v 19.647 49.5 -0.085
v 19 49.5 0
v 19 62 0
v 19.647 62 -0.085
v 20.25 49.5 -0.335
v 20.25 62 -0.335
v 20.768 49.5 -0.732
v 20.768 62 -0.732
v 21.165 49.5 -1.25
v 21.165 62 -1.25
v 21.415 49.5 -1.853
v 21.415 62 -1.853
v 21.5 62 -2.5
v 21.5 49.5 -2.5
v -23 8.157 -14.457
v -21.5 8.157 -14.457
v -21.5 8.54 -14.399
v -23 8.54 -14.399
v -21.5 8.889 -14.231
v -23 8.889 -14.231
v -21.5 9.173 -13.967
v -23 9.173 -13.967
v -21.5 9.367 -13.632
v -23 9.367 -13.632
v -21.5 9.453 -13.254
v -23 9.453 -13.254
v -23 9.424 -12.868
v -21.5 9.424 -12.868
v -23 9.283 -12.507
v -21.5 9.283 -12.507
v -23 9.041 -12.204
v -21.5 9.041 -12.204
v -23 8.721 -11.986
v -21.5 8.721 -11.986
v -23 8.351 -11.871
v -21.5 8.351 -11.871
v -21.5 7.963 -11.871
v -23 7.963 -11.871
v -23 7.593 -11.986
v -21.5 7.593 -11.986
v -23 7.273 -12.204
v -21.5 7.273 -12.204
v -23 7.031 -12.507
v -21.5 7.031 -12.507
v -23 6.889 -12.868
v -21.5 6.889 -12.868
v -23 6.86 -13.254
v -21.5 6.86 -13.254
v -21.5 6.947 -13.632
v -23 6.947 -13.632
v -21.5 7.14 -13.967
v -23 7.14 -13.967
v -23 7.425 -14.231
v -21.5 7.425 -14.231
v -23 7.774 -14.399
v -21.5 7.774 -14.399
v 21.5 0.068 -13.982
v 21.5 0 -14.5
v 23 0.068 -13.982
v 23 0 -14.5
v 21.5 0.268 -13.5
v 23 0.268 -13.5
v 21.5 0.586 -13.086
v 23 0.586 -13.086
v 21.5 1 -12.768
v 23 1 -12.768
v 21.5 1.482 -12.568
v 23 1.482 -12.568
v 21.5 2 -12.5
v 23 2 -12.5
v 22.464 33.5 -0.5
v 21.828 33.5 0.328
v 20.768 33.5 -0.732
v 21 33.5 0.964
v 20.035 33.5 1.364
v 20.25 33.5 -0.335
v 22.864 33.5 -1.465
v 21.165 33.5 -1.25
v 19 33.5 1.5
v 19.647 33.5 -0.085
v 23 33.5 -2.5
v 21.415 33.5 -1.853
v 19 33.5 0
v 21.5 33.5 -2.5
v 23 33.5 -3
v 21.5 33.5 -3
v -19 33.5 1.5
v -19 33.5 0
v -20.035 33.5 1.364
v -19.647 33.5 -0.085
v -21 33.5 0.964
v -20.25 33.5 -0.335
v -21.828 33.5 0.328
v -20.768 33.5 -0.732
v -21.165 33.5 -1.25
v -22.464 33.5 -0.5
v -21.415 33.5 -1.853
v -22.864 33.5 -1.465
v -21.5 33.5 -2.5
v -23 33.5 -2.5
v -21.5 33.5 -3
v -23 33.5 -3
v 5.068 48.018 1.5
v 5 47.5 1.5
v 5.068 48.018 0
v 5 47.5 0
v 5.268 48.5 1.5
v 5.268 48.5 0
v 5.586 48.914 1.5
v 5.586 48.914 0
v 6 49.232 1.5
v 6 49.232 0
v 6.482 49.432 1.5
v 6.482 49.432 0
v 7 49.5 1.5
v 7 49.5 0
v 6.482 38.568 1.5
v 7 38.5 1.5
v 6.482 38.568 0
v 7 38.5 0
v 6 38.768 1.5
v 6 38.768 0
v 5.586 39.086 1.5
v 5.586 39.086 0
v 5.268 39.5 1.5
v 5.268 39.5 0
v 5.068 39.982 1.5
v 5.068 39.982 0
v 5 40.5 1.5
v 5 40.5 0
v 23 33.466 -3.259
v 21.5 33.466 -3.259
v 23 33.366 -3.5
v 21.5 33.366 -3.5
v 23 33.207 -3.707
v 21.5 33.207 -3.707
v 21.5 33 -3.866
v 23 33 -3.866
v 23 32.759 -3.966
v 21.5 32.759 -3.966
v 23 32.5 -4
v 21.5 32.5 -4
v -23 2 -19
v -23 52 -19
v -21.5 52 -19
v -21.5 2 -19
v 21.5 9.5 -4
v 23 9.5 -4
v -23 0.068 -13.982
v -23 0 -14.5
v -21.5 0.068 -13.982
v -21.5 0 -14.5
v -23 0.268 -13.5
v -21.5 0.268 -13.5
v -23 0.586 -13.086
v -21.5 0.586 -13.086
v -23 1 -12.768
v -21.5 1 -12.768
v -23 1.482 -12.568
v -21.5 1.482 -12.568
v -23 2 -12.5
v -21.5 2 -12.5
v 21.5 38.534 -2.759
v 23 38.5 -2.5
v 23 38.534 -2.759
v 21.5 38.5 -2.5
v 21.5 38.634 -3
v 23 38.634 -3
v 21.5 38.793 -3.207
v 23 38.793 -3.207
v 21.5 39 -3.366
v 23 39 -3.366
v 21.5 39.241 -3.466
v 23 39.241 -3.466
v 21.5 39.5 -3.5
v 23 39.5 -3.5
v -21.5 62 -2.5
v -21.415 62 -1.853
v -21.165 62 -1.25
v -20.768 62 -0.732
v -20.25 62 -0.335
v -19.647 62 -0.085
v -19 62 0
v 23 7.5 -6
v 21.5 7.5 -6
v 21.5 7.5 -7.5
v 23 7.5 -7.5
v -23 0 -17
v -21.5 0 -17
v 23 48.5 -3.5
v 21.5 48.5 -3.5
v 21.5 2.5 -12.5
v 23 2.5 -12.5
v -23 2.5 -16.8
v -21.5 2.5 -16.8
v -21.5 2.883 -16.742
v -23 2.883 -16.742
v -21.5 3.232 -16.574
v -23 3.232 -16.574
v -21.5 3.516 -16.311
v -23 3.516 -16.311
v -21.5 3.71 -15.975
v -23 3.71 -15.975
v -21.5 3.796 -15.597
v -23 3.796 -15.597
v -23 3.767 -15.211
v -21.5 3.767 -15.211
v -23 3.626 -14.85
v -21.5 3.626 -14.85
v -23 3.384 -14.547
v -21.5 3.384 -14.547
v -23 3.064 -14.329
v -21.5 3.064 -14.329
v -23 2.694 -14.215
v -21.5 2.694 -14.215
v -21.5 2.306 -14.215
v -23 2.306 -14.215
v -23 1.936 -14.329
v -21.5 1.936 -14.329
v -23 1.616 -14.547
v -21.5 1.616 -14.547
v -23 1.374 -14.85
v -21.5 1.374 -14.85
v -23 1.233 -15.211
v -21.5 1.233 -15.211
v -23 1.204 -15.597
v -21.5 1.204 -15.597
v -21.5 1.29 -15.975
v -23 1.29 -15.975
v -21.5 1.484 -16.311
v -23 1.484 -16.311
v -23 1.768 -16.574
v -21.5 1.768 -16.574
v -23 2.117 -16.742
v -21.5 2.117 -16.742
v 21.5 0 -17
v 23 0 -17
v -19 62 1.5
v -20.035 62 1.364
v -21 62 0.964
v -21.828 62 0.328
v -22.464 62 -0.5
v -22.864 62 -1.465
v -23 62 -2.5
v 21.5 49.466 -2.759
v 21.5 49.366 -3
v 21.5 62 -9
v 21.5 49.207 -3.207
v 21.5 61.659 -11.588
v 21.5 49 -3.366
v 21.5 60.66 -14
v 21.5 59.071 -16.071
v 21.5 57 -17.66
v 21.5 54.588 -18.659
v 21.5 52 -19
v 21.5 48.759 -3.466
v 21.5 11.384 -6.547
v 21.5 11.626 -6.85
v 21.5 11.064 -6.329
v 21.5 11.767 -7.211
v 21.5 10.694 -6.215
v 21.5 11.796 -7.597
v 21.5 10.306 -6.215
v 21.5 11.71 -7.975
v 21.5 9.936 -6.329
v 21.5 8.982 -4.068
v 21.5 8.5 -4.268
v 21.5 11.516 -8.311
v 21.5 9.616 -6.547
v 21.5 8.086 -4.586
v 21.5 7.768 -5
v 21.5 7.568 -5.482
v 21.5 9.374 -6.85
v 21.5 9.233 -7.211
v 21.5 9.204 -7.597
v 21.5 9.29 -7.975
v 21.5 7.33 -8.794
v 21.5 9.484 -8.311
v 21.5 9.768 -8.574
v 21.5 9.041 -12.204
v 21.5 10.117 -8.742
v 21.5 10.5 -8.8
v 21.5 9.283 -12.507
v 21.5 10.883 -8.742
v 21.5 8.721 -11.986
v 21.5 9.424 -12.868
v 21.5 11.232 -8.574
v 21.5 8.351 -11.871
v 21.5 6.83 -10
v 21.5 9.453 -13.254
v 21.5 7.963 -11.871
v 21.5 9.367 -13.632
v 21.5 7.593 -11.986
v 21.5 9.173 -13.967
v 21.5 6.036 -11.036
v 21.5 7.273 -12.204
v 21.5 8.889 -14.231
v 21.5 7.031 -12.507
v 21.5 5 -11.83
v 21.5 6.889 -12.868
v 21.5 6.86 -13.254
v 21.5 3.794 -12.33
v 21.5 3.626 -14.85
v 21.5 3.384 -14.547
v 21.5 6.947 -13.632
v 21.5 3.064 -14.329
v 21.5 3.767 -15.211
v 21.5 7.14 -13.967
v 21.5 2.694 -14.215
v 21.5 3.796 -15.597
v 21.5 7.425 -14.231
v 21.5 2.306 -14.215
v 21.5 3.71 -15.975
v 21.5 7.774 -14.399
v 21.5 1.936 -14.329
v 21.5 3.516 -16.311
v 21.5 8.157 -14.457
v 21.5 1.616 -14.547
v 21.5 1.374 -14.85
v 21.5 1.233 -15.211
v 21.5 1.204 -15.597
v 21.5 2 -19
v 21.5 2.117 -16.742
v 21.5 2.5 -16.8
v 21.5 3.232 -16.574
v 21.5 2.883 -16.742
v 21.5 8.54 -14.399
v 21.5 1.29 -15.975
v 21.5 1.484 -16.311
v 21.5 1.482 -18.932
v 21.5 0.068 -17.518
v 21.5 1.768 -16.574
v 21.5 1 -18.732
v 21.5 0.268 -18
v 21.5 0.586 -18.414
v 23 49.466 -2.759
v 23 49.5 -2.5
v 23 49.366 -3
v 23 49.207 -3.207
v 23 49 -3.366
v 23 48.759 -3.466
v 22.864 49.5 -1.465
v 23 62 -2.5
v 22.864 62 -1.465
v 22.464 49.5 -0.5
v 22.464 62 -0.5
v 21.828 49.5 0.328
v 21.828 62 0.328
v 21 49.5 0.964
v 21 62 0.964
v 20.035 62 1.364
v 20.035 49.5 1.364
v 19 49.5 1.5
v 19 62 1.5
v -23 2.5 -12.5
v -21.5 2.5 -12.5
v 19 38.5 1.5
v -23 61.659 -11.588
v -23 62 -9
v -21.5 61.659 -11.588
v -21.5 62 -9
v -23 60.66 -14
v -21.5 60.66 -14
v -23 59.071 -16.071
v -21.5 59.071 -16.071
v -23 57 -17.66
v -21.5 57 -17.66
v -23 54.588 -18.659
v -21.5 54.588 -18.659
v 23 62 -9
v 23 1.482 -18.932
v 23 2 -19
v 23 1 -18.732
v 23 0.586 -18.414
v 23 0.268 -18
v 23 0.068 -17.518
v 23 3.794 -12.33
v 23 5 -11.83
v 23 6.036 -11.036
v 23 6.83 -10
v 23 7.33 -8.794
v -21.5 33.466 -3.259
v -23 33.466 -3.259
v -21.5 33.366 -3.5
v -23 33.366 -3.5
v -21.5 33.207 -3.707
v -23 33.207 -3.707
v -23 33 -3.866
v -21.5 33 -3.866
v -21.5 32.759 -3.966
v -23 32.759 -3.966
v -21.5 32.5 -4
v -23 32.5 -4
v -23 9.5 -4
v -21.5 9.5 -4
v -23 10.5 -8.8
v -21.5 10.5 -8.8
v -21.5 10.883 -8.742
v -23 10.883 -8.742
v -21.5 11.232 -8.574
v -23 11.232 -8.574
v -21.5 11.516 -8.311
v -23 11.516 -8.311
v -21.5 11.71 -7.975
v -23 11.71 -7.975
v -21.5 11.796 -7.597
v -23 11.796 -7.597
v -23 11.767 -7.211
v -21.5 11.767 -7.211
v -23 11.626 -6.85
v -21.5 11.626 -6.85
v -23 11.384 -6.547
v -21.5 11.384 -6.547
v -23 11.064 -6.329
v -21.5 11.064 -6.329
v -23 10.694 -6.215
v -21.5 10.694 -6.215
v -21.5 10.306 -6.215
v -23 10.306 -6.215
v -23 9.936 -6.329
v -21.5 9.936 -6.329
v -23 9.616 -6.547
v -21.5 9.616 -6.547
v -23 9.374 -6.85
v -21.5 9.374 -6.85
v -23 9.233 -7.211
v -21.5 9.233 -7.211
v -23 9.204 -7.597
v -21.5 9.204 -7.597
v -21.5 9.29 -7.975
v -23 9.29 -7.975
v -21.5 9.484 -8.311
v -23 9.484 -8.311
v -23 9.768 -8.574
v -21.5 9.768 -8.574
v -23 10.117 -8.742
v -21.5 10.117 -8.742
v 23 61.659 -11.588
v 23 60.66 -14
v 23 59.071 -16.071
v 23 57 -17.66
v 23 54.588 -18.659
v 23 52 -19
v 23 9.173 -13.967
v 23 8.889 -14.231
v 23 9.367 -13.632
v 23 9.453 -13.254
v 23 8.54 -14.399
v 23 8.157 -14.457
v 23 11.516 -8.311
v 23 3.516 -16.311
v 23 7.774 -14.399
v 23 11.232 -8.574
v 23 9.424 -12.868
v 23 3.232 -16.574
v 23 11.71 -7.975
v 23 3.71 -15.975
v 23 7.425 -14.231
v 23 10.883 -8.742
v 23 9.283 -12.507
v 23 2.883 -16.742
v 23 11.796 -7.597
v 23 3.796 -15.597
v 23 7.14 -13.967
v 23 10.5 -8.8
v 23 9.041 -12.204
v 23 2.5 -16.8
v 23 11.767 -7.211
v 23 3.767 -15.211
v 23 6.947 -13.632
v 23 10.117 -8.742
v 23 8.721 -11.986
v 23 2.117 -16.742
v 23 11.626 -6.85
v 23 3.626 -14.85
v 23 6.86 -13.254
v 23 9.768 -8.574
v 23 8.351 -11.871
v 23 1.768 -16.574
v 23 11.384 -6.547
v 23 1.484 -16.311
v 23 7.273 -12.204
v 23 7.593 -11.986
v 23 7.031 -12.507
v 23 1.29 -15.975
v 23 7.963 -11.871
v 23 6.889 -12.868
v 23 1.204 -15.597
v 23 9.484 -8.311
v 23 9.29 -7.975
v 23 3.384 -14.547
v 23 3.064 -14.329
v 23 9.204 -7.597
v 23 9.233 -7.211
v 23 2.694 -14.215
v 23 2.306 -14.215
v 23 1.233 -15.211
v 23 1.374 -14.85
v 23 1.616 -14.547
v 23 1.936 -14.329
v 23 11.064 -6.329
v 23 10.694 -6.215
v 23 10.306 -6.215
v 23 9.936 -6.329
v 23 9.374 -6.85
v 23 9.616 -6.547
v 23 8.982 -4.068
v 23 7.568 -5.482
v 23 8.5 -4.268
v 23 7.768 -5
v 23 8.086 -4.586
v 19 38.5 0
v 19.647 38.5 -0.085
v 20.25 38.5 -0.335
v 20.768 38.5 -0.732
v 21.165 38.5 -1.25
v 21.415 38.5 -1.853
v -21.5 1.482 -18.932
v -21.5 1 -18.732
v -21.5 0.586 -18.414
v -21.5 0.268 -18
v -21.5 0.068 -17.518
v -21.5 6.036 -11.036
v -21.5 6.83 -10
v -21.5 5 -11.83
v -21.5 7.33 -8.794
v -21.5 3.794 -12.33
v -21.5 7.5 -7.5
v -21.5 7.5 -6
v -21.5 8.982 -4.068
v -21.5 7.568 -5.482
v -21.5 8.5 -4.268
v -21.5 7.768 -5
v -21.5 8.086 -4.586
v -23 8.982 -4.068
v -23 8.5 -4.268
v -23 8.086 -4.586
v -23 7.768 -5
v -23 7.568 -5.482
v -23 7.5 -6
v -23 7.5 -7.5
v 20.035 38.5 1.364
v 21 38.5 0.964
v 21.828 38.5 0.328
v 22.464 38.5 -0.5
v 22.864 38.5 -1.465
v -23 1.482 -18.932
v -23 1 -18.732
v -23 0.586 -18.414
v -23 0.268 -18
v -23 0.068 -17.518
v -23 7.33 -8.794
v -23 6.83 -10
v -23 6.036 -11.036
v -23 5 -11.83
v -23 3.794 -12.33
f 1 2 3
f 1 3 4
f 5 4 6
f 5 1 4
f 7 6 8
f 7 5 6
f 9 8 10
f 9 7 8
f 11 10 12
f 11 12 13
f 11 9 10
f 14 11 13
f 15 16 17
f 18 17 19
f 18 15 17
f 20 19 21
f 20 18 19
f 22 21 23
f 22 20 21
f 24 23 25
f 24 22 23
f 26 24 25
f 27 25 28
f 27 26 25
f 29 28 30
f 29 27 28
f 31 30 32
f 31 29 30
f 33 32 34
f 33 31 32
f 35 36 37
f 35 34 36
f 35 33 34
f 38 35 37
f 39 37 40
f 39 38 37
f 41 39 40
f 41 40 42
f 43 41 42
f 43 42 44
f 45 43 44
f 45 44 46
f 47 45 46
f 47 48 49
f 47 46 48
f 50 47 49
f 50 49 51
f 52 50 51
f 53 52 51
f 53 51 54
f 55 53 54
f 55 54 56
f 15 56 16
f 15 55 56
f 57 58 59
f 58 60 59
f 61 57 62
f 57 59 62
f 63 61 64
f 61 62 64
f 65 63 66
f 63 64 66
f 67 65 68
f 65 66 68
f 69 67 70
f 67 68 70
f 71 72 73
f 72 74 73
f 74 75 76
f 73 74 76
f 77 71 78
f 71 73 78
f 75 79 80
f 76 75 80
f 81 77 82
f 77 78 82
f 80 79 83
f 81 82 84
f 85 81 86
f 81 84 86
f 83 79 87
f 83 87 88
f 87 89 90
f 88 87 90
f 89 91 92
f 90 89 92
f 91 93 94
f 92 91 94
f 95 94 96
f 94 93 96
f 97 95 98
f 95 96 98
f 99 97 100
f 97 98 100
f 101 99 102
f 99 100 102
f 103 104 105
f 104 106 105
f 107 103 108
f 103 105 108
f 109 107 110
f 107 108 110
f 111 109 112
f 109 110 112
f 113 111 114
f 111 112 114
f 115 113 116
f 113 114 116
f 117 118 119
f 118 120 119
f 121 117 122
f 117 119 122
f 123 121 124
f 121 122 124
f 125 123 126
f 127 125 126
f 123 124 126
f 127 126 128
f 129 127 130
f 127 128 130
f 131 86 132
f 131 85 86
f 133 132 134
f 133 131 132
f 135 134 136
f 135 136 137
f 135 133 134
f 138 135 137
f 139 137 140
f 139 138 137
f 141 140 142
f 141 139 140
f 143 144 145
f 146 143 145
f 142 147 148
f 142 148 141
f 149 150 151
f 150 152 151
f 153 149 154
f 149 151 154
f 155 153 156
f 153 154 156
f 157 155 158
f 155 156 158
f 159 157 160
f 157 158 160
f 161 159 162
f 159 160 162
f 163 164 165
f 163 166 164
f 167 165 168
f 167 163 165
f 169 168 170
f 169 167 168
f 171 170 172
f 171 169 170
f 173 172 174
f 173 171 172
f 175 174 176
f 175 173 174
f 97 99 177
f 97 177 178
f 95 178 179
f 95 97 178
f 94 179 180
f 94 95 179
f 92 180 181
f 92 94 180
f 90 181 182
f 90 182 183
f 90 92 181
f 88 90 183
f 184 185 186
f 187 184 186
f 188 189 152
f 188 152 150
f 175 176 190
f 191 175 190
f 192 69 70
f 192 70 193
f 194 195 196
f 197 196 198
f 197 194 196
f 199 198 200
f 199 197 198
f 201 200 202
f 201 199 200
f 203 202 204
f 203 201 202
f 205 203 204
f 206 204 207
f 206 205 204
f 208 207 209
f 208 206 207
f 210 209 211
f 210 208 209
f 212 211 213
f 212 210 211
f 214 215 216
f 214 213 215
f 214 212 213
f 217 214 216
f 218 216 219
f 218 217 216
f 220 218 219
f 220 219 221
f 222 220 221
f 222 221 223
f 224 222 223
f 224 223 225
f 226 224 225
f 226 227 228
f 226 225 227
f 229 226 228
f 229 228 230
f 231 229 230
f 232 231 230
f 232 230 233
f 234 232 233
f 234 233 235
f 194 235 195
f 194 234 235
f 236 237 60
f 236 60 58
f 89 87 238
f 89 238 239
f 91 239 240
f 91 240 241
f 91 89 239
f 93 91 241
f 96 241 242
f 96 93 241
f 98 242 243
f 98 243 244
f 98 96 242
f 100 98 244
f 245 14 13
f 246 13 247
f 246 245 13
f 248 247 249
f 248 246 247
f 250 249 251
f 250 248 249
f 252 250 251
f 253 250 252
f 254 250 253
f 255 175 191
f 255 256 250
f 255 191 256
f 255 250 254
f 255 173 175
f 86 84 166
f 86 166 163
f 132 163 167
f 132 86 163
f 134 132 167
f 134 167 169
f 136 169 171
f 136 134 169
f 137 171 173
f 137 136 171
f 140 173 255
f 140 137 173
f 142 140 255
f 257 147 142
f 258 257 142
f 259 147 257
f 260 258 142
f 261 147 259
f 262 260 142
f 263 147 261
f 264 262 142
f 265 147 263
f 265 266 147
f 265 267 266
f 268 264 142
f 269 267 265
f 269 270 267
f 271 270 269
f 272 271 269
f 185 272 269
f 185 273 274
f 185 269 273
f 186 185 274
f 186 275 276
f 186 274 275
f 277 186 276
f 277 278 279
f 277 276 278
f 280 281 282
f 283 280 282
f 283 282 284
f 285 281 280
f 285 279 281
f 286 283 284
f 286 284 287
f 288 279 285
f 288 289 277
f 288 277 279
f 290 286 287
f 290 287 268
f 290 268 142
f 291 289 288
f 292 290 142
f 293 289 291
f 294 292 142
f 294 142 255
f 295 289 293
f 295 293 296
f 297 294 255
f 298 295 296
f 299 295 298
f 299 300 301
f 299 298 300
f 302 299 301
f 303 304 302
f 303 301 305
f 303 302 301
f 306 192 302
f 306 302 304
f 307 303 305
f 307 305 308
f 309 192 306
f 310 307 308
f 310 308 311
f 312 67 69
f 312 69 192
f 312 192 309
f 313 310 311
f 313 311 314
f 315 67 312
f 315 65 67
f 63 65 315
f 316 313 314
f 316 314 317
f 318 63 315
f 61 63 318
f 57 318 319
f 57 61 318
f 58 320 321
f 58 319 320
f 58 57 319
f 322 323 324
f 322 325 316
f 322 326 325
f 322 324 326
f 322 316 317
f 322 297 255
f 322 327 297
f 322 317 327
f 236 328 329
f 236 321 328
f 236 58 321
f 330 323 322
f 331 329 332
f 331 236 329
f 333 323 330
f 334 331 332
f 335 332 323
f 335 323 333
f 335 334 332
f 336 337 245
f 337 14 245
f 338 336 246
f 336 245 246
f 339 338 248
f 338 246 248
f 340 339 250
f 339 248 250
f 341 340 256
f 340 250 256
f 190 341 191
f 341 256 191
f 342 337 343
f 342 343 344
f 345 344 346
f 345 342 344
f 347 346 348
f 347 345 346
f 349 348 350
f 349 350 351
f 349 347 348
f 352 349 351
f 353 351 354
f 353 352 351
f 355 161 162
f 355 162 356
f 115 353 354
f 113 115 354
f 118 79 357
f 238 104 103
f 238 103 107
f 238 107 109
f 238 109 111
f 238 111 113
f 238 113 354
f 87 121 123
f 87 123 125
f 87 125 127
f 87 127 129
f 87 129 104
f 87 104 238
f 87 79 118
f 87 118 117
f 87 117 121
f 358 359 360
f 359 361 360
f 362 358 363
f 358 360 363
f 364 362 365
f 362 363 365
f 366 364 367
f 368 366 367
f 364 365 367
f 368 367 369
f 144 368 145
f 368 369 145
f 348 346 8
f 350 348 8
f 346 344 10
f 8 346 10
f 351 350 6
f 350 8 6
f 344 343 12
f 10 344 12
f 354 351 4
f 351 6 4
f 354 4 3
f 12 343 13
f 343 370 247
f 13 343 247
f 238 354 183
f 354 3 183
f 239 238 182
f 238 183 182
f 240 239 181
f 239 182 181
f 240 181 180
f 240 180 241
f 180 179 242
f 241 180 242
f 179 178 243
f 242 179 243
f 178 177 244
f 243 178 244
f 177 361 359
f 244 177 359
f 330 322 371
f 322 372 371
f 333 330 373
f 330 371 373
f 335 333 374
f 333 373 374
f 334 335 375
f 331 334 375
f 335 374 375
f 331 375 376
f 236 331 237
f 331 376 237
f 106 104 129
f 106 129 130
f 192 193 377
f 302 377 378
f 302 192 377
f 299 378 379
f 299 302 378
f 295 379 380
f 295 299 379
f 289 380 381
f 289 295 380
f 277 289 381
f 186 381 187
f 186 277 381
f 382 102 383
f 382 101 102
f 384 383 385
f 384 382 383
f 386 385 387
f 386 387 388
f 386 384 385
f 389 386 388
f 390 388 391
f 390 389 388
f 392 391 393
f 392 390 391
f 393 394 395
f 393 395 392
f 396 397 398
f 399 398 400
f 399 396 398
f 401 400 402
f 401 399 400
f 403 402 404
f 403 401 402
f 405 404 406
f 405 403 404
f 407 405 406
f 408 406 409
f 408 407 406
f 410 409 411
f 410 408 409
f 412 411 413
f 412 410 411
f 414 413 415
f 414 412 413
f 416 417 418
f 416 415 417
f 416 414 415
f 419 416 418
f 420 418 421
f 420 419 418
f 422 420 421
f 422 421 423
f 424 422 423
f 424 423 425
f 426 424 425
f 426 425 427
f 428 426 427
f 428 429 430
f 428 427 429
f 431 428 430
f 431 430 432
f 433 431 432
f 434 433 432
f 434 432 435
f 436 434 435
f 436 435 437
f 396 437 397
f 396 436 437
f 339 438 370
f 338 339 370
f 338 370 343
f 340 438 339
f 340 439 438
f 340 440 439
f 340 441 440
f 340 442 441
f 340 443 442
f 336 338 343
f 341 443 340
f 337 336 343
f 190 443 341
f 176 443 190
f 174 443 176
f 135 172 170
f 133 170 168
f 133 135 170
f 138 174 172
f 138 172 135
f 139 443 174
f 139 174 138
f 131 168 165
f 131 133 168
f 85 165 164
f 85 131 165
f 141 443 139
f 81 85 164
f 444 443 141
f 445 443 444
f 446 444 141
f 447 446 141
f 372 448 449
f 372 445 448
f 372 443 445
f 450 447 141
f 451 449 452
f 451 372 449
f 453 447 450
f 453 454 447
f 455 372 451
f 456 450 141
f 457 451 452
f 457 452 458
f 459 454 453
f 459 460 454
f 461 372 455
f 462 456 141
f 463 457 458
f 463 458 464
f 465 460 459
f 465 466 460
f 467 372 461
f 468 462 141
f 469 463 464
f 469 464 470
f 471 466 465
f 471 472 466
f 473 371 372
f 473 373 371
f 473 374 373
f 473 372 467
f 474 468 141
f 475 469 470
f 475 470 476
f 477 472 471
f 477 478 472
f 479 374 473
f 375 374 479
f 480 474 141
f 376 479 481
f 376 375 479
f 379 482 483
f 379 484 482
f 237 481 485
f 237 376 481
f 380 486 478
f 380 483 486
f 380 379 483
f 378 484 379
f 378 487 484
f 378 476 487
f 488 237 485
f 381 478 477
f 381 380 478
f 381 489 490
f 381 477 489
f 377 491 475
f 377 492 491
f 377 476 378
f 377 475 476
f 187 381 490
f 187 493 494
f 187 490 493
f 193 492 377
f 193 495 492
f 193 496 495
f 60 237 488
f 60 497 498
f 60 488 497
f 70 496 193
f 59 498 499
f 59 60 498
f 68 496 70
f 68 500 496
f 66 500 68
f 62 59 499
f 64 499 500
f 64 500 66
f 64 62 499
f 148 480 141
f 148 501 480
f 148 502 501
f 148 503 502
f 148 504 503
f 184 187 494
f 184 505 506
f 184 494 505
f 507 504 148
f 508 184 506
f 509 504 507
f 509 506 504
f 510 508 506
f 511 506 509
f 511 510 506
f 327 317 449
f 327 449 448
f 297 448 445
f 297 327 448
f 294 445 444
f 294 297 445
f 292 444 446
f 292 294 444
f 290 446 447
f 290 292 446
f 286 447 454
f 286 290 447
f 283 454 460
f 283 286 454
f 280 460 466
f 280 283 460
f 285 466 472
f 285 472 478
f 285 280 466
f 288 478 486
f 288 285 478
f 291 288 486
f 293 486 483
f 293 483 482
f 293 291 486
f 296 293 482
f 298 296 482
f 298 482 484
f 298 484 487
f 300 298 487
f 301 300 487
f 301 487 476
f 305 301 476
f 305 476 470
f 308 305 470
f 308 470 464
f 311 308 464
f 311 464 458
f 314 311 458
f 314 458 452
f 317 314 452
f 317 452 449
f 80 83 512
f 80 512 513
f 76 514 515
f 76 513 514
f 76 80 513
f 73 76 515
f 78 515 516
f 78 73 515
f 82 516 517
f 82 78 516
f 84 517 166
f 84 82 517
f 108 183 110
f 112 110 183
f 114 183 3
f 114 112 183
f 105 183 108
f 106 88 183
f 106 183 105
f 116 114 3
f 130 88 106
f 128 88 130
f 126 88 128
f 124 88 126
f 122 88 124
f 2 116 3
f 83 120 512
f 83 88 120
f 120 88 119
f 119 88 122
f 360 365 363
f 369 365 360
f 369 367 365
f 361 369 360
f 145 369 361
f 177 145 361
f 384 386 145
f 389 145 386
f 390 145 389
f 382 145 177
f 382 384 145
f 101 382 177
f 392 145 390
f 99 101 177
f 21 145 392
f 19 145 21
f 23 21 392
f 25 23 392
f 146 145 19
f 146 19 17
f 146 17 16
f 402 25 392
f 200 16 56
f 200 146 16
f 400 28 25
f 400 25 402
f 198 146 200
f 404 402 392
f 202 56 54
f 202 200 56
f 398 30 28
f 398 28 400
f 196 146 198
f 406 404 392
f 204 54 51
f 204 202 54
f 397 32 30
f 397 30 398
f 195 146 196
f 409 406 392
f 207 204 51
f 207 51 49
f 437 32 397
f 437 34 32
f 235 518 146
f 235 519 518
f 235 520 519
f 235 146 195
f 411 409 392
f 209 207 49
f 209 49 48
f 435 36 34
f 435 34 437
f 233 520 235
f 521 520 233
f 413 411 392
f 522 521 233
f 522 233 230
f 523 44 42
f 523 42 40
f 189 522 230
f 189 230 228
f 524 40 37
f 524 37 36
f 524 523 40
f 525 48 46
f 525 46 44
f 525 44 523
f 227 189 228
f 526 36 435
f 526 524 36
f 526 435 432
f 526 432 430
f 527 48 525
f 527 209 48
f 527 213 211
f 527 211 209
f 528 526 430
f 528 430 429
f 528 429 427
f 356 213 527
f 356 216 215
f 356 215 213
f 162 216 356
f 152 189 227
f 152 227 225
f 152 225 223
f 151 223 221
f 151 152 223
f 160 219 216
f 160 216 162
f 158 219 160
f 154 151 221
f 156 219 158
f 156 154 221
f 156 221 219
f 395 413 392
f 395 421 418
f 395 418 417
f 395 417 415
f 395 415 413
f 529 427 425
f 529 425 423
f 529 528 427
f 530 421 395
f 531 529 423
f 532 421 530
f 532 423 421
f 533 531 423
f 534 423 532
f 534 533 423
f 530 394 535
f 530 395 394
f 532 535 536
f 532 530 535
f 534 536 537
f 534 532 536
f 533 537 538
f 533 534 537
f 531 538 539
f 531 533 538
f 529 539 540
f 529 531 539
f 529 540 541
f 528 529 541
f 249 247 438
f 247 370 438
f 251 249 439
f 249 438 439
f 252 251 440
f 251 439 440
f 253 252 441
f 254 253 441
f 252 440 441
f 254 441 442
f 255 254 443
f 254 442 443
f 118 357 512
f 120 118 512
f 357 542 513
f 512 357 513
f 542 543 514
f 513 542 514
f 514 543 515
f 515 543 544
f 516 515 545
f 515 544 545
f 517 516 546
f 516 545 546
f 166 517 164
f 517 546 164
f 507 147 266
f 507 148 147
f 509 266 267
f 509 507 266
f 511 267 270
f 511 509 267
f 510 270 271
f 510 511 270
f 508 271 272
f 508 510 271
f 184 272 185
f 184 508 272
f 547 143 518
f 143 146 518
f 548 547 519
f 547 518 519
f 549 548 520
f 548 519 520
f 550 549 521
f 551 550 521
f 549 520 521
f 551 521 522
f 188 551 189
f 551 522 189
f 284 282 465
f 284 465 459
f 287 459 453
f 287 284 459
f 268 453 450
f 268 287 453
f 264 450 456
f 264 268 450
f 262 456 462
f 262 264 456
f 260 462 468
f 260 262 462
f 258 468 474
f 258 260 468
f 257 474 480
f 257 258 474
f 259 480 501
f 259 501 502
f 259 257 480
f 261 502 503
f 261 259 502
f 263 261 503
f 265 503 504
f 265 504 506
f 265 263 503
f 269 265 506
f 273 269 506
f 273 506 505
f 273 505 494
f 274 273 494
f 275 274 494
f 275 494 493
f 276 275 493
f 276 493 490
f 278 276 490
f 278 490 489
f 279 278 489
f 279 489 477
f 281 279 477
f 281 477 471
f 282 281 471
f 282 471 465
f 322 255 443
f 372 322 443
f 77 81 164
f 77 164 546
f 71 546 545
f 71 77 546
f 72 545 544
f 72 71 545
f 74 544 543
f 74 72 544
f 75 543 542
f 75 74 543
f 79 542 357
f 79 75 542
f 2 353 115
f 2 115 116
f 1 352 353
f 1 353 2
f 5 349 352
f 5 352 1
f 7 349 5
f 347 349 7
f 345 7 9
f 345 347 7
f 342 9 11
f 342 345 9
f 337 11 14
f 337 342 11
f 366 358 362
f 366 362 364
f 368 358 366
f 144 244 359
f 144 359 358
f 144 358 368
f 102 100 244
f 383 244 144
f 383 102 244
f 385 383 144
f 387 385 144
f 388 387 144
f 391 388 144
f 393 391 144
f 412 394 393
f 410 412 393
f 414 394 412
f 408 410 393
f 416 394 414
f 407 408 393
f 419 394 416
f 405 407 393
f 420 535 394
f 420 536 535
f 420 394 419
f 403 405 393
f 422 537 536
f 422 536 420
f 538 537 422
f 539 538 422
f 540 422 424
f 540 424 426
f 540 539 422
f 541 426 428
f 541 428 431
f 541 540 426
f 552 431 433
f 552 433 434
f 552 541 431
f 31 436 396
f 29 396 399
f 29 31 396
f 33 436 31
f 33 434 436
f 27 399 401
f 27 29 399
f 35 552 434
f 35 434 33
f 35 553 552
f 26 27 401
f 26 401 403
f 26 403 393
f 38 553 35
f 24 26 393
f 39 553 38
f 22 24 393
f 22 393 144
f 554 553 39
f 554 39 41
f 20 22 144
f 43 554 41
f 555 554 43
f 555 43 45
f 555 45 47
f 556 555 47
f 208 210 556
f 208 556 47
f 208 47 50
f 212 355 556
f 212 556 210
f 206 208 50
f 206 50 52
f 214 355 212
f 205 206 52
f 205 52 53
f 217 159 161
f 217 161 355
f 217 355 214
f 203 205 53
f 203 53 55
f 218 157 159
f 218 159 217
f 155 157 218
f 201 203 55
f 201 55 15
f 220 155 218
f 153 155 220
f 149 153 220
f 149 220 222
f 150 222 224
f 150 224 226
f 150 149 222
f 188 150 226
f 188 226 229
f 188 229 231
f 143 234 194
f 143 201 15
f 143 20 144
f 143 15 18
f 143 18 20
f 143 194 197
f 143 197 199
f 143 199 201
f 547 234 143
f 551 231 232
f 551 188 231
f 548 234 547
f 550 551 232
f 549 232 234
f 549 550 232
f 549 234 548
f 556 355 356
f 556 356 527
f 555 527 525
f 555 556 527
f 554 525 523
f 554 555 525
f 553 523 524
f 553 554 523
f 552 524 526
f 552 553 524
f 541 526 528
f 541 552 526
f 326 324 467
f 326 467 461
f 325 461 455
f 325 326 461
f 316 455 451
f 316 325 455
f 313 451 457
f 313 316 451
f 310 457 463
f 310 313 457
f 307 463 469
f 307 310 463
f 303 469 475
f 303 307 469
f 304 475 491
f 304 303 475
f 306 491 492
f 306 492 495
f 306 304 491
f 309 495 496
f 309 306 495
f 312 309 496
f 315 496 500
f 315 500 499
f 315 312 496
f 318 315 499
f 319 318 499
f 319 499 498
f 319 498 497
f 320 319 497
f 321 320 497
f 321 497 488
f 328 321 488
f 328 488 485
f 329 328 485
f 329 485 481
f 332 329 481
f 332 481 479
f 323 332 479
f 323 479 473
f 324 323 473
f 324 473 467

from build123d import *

# Parameters (mm, degrees)
BASE_FLANGE1_DEPTH      = 62
CUT_EXTRUDE4_START      = -23
CUT_EXTRUDE4_OUTLINE_R  = 1.3
CUT_EXTRUDE4_DEPTH      = 46
CUT_EXTRUDE5_DEPTH      = 69.804069647
CUT_EXTRUDE5_DEPTH_BACK = 69.804069647
SKETCH9_W               = 9
SKETCH9_H               = 7.5
CUT_EXTRUDE7_DEPTH      = 69.804069647
CUT_EXTRUDE7_DEPTH_BACK = 69.804069647
SKETCH12_W              = 5.5
SKETCH12_H              = 26
SKETCH14_W              = 5
SKETCH14_H              = 11
CUT_EXTRUDE8_DEPTH      = 18
FILLET1_R               = 10
FILLET2_R               = 2
FILLET3_R               = 1


# Read off the part's stored shape, not the designer's step: Cut-Extrude4
# Sheet-metal steps are written as plain solids
with BuildPart() as part:
    # Sketch2 → Base-Flange1 (new body)
    with BuildSketch(Plane(origin=(0, 0, 0), x_dir=(1, 0, 0), z_dir=(0, 1, 0))):
        with BuildLine():
            Line((-21.5, 19), (-21.5, 2.5))
            ThreePointArc((-21.5, 2.5), (-20.767766953, 0.732233047), (-19, 0))
            Line((-19, 0), (19, 0))
            ThreePointArc((19, 0), (20.767766953, 0.732233047), (21.5, 2.5))
            Line((21.5, 2.5), (21.5, 19))
            Line((21.5, 19), (23, 19))
            Line((23, 19), (23, 2.5))
            ThreePointArc((23, 2.5), (21.828427125, -0.328427125), (19, -1.5))
            Line((19, -1.5), (-19, -1.5))
            ThreePointArc((-19, -1.5), (-21.828427125, -0.328427125), (-23, 2.5))
            Line((-23, 2.5), (-23, 19))
            Line((-23, 19), (-21.5, 19))
        make_face()
    extrude(amount=BASE_FLANGE1_DEPTH)

    # Cut-Extrude4 outline → Cut-Extrude4 (cut)
    with BuildSketch(Plane(origin=(0, 0, 0), x_dir=(0, 0, -1), z_dir=(1, 0, 0)).offset(CUT_EXTRUDE4_START)):
        with Locations((15.5, 2.5)):
            Circle(CUT_EXTRUDE4_OUTLINE_R)
        with Locations((13.156854249, 8.156854249)):
            Circle(CUT_EXTRUDE4_OUTLINE_R)
        with Locations((7.5, 10.5)):
            Circle(CUT_EXTRUDE4_OUTLINE_R)
        with BuildLine():
            ThreePointArc((12.5, 2.5), (7.5, 7.5), (2.5, 2.5))
            Line((2.5, 2.5), (2.5, 0))
            Line((2.5, 0), (12.5, 0))
            Line((12.5, 0), (12.5, 2.5))
        make_face()
    extrude(amount=CUT_EXTRUDE4_DEPTH, mode=Mode.SUBTRACT)

    # Sketch9 → Cut-Extrude5 (cut, two sides: drawn at the far end of the back side and taken through both)
    with BuildSketch(Plane(origin=(0, 0, 0), x_dir=(0, 0, -1), z_dir=(1, 0, 0)).offset(-CUT_EXTRUDE5_DEPTH_BACK)):
        with Locations((3, 3.75)):
            Rectangle(SKETCH9_W, SKETCH9_H)
    extrude(amount=CUT_EXTRUDE5_DEPTH + CUT_EXTRUDE5_DEPTH_BACK, mode=Mode.SUBTRACT)

    # Sketch12 → Cut-Extrude7 (cut, two sides: drawn at the far end of the back side and taken through both)
    with BuildSketch(Plane(origin=(0, 0, 0), x_dir=(0, 0, -1), z_dir=(1, 0, 0)).offset(-CUT_EXTRUDE7_DEPTH_BACK)):
        with Locations((1.25, 20.5)):
            Rectangle(SKETCH12_W, SKETCH12_H)
    extrude(amount=CUT_EXTRUDE7_DEPTH + CUT_EXTRUDE7_DEPTH_BACK, mode=Mode.SUBTRACT)

    # Sketch14 → Cut-Extrude8 (cut)
    with BuildSketch(Plane(origin=(23, 0, 0), x_dir=(0, 0, -1), z_dir=(1, 0, 0))):
        with Locations((1, 44)):
            Rectangle(SKETCH14_W, SKETCH14_H)
    extrude(amount=-CUT_EXTRUDE8_DEPTH, mode=Mode.SUBTRACT)

    # Fillet1
    fillet1_edges = [part.edges().sort_by_distance(p)[0] for p in [
        (-22.25, 62, -19),
        (22.25, 62, -19),
    ]]
    fillet(fillet1_edges, radius=FILLET1_R)

    # Fillet2
    fillet2_edges = [part.edges().sort_by_distance(p)[0] for p in [
        (-22.25, 0, -19),
        (22.25, 0, -19),
        (22.25, 7.5, -4),
        (-22.25, 7.5, -4),
        (5, 49.5, 0.75),
        (5, 38.5, 0.75),
        (-22.25, 0, -12.5),
        (22.25, 0, -12.5),
    ]]
    fillet(fillet2_edges, radius=FILLET2_R)

    # Fillet3
    fillet3_edges = [part.edges().sort_by_distance(p)[0] for p in [
        (22.25, 33.5, -4),
        (-22.25, 33.5, -4),
        (22.25, 49.5, -3.5),
        (22.25, 38.5, -3.5),
    ]]
    fillet(fillet3_edges, radius=FILLET3_R)


solid = part.part
